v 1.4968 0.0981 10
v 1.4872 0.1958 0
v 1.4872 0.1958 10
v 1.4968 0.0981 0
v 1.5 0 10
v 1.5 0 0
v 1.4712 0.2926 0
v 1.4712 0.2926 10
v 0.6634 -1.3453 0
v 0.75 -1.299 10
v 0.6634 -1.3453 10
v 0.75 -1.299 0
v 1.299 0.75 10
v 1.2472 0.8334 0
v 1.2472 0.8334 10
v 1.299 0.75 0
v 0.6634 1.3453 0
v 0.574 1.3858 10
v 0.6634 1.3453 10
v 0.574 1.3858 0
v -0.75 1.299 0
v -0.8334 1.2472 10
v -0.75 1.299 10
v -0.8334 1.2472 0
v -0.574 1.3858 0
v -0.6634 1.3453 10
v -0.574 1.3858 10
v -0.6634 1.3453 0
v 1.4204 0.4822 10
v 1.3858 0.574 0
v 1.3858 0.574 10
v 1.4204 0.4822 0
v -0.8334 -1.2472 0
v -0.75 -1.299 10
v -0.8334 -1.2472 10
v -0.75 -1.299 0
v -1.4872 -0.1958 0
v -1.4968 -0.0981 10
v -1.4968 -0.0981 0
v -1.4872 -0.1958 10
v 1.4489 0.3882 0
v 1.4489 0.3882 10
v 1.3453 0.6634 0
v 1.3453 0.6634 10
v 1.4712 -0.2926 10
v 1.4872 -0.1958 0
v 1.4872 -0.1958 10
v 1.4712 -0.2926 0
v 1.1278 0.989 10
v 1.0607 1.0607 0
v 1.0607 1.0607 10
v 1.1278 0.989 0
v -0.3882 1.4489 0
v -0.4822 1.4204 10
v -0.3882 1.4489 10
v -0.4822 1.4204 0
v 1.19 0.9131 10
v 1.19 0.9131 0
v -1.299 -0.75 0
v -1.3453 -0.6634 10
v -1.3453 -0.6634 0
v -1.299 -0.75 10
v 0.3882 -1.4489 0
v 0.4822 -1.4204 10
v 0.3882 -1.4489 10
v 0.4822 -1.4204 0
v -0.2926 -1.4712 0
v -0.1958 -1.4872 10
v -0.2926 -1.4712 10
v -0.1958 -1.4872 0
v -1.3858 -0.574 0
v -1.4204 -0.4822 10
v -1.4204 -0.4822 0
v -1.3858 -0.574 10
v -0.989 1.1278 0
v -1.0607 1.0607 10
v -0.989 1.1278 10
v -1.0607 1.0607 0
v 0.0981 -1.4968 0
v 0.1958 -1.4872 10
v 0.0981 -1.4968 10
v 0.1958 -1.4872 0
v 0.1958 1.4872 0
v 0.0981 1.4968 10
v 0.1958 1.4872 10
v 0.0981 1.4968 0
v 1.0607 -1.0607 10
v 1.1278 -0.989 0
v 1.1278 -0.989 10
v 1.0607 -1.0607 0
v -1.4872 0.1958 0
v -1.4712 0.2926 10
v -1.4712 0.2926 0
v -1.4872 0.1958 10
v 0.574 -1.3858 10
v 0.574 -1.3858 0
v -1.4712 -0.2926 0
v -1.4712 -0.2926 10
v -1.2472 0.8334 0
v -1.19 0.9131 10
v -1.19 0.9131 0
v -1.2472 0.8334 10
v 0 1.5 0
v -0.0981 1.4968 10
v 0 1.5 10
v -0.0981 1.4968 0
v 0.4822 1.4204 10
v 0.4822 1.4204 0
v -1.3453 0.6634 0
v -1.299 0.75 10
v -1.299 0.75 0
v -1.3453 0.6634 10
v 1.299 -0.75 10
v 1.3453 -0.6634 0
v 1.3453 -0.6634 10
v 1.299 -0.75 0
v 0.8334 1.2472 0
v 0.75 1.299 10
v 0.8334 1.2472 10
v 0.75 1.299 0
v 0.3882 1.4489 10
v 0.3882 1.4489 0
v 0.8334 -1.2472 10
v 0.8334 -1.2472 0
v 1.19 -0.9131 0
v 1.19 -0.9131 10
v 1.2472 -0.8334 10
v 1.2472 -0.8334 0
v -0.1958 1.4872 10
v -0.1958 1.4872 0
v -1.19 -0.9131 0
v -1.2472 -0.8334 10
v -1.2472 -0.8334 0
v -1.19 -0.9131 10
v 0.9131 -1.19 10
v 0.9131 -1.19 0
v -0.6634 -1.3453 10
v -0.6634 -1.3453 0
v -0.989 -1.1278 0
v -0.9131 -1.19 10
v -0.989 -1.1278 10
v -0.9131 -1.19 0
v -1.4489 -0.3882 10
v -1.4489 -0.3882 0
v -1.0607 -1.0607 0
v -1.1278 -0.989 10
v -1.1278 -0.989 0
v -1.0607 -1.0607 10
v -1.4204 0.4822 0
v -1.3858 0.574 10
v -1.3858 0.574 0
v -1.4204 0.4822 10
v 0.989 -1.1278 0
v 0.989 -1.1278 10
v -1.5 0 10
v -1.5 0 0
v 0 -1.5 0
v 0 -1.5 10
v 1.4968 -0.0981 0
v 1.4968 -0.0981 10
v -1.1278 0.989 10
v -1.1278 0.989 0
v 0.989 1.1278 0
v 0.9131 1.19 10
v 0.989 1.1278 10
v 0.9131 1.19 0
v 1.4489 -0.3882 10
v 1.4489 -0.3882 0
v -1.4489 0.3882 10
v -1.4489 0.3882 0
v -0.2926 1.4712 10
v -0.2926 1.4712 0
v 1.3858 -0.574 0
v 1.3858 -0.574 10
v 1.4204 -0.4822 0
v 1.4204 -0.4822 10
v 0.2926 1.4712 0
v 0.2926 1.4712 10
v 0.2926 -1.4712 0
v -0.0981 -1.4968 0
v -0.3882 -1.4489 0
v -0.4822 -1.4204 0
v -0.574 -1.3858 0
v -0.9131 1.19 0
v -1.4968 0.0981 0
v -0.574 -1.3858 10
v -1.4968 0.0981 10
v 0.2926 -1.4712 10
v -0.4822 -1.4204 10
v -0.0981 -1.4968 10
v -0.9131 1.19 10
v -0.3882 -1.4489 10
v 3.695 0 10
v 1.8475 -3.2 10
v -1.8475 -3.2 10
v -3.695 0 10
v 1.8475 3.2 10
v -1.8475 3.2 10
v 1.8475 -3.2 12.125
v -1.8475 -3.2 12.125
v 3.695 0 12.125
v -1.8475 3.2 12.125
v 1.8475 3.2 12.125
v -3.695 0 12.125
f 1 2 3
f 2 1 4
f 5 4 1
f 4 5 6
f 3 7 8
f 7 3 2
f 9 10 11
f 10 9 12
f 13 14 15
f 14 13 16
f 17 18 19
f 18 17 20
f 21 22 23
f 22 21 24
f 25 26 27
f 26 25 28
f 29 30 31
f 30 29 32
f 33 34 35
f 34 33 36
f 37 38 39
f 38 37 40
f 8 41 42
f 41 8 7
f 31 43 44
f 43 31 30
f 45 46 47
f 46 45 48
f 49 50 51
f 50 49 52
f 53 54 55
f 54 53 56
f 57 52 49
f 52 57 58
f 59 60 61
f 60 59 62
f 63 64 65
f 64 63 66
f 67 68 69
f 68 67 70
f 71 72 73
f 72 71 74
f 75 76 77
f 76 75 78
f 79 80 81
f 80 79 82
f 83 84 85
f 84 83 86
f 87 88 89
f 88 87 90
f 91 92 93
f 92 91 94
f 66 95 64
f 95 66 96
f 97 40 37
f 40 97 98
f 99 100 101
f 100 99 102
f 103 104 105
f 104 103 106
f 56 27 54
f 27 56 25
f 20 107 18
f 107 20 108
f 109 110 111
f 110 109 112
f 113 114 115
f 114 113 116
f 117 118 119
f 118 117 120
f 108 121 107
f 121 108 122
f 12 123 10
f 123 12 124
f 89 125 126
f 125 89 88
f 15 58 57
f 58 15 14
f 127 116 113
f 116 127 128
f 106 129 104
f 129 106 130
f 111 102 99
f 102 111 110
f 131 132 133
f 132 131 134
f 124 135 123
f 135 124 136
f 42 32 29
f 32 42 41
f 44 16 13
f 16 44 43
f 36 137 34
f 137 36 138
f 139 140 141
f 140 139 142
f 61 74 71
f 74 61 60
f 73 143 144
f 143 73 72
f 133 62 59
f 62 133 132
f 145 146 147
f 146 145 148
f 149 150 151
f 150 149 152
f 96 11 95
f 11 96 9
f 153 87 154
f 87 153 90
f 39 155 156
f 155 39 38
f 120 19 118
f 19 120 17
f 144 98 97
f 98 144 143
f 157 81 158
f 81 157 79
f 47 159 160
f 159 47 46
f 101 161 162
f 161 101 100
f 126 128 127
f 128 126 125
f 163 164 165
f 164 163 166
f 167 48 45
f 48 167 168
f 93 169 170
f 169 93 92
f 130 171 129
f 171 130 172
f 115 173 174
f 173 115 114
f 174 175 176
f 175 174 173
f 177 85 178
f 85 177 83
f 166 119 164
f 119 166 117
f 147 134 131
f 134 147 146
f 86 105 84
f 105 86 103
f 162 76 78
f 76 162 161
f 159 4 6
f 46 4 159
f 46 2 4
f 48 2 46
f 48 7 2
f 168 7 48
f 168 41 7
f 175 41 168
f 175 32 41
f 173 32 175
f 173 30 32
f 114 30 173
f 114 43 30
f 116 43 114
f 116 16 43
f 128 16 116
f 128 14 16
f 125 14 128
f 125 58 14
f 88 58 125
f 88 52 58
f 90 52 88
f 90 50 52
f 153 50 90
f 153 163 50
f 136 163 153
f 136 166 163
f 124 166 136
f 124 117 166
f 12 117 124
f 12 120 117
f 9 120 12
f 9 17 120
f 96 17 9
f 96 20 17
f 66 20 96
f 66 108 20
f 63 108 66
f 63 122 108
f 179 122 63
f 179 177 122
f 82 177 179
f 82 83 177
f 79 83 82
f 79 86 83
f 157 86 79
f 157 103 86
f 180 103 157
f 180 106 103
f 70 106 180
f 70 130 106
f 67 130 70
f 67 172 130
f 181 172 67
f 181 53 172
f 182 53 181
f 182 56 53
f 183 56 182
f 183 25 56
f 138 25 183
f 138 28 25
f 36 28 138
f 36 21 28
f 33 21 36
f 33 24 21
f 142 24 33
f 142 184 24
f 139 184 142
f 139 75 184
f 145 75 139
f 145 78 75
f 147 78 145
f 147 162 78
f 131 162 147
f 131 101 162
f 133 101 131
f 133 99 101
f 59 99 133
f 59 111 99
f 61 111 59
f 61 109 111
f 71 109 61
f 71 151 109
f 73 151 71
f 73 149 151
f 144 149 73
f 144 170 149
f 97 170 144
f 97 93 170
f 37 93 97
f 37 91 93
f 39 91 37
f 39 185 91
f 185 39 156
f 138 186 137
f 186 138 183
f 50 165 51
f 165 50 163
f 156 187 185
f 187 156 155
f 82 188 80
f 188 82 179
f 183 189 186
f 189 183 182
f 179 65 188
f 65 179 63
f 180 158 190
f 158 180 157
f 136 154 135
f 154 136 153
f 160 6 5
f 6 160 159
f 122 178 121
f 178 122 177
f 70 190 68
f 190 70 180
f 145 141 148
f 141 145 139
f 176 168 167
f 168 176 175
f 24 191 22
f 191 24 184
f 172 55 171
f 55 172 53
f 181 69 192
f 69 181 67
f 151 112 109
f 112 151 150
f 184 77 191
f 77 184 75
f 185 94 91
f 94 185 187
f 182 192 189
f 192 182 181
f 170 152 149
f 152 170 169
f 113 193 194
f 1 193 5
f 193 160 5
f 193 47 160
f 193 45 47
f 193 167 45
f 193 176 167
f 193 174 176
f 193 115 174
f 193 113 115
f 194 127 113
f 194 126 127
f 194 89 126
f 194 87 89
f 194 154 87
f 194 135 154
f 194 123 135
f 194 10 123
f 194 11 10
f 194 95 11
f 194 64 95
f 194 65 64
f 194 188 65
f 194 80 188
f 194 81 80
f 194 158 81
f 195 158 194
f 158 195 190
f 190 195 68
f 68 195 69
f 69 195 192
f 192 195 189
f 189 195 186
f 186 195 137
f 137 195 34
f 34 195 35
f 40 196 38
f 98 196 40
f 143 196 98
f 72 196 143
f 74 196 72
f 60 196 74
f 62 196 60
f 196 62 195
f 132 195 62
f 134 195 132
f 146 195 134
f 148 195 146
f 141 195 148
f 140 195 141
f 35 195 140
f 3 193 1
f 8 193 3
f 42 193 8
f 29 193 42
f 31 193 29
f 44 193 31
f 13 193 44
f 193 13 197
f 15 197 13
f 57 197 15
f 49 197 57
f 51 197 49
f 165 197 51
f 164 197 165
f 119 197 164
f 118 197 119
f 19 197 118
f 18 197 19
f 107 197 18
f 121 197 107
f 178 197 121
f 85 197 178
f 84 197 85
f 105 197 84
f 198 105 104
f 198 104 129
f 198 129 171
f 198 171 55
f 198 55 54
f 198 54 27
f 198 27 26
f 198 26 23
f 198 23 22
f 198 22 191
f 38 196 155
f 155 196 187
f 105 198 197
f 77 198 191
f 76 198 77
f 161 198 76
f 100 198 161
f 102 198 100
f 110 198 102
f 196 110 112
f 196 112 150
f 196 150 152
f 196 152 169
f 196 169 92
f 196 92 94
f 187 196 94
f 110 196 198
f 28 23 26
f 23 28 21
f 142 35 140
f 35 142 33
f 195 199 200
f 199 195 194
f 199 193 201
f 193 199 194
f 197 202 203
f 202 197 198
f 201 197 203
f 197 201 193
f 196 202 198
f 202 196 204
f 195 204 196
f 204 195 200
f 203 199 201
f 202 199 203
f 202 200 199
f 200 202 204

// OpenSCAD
$fn = 96;

shaft_d = 3.0;
length = 10.0;

head_flat_d = 6.4;      // across flats
head_h = 2.125;

module hex_prism(af, h) {
    // Regular hexagon: across flats = 2 * apothem
    r = af / sqrt(3);   // circumradius
    cylinder(h = h, r = r, $fn = 6);
}

union() {
    // Shaft
    cylinder(h = length, d = shaft_d);

    // Hex head on top
    translate([0,0,length])
        hex_prism(head_flat_d, head_h);
}
